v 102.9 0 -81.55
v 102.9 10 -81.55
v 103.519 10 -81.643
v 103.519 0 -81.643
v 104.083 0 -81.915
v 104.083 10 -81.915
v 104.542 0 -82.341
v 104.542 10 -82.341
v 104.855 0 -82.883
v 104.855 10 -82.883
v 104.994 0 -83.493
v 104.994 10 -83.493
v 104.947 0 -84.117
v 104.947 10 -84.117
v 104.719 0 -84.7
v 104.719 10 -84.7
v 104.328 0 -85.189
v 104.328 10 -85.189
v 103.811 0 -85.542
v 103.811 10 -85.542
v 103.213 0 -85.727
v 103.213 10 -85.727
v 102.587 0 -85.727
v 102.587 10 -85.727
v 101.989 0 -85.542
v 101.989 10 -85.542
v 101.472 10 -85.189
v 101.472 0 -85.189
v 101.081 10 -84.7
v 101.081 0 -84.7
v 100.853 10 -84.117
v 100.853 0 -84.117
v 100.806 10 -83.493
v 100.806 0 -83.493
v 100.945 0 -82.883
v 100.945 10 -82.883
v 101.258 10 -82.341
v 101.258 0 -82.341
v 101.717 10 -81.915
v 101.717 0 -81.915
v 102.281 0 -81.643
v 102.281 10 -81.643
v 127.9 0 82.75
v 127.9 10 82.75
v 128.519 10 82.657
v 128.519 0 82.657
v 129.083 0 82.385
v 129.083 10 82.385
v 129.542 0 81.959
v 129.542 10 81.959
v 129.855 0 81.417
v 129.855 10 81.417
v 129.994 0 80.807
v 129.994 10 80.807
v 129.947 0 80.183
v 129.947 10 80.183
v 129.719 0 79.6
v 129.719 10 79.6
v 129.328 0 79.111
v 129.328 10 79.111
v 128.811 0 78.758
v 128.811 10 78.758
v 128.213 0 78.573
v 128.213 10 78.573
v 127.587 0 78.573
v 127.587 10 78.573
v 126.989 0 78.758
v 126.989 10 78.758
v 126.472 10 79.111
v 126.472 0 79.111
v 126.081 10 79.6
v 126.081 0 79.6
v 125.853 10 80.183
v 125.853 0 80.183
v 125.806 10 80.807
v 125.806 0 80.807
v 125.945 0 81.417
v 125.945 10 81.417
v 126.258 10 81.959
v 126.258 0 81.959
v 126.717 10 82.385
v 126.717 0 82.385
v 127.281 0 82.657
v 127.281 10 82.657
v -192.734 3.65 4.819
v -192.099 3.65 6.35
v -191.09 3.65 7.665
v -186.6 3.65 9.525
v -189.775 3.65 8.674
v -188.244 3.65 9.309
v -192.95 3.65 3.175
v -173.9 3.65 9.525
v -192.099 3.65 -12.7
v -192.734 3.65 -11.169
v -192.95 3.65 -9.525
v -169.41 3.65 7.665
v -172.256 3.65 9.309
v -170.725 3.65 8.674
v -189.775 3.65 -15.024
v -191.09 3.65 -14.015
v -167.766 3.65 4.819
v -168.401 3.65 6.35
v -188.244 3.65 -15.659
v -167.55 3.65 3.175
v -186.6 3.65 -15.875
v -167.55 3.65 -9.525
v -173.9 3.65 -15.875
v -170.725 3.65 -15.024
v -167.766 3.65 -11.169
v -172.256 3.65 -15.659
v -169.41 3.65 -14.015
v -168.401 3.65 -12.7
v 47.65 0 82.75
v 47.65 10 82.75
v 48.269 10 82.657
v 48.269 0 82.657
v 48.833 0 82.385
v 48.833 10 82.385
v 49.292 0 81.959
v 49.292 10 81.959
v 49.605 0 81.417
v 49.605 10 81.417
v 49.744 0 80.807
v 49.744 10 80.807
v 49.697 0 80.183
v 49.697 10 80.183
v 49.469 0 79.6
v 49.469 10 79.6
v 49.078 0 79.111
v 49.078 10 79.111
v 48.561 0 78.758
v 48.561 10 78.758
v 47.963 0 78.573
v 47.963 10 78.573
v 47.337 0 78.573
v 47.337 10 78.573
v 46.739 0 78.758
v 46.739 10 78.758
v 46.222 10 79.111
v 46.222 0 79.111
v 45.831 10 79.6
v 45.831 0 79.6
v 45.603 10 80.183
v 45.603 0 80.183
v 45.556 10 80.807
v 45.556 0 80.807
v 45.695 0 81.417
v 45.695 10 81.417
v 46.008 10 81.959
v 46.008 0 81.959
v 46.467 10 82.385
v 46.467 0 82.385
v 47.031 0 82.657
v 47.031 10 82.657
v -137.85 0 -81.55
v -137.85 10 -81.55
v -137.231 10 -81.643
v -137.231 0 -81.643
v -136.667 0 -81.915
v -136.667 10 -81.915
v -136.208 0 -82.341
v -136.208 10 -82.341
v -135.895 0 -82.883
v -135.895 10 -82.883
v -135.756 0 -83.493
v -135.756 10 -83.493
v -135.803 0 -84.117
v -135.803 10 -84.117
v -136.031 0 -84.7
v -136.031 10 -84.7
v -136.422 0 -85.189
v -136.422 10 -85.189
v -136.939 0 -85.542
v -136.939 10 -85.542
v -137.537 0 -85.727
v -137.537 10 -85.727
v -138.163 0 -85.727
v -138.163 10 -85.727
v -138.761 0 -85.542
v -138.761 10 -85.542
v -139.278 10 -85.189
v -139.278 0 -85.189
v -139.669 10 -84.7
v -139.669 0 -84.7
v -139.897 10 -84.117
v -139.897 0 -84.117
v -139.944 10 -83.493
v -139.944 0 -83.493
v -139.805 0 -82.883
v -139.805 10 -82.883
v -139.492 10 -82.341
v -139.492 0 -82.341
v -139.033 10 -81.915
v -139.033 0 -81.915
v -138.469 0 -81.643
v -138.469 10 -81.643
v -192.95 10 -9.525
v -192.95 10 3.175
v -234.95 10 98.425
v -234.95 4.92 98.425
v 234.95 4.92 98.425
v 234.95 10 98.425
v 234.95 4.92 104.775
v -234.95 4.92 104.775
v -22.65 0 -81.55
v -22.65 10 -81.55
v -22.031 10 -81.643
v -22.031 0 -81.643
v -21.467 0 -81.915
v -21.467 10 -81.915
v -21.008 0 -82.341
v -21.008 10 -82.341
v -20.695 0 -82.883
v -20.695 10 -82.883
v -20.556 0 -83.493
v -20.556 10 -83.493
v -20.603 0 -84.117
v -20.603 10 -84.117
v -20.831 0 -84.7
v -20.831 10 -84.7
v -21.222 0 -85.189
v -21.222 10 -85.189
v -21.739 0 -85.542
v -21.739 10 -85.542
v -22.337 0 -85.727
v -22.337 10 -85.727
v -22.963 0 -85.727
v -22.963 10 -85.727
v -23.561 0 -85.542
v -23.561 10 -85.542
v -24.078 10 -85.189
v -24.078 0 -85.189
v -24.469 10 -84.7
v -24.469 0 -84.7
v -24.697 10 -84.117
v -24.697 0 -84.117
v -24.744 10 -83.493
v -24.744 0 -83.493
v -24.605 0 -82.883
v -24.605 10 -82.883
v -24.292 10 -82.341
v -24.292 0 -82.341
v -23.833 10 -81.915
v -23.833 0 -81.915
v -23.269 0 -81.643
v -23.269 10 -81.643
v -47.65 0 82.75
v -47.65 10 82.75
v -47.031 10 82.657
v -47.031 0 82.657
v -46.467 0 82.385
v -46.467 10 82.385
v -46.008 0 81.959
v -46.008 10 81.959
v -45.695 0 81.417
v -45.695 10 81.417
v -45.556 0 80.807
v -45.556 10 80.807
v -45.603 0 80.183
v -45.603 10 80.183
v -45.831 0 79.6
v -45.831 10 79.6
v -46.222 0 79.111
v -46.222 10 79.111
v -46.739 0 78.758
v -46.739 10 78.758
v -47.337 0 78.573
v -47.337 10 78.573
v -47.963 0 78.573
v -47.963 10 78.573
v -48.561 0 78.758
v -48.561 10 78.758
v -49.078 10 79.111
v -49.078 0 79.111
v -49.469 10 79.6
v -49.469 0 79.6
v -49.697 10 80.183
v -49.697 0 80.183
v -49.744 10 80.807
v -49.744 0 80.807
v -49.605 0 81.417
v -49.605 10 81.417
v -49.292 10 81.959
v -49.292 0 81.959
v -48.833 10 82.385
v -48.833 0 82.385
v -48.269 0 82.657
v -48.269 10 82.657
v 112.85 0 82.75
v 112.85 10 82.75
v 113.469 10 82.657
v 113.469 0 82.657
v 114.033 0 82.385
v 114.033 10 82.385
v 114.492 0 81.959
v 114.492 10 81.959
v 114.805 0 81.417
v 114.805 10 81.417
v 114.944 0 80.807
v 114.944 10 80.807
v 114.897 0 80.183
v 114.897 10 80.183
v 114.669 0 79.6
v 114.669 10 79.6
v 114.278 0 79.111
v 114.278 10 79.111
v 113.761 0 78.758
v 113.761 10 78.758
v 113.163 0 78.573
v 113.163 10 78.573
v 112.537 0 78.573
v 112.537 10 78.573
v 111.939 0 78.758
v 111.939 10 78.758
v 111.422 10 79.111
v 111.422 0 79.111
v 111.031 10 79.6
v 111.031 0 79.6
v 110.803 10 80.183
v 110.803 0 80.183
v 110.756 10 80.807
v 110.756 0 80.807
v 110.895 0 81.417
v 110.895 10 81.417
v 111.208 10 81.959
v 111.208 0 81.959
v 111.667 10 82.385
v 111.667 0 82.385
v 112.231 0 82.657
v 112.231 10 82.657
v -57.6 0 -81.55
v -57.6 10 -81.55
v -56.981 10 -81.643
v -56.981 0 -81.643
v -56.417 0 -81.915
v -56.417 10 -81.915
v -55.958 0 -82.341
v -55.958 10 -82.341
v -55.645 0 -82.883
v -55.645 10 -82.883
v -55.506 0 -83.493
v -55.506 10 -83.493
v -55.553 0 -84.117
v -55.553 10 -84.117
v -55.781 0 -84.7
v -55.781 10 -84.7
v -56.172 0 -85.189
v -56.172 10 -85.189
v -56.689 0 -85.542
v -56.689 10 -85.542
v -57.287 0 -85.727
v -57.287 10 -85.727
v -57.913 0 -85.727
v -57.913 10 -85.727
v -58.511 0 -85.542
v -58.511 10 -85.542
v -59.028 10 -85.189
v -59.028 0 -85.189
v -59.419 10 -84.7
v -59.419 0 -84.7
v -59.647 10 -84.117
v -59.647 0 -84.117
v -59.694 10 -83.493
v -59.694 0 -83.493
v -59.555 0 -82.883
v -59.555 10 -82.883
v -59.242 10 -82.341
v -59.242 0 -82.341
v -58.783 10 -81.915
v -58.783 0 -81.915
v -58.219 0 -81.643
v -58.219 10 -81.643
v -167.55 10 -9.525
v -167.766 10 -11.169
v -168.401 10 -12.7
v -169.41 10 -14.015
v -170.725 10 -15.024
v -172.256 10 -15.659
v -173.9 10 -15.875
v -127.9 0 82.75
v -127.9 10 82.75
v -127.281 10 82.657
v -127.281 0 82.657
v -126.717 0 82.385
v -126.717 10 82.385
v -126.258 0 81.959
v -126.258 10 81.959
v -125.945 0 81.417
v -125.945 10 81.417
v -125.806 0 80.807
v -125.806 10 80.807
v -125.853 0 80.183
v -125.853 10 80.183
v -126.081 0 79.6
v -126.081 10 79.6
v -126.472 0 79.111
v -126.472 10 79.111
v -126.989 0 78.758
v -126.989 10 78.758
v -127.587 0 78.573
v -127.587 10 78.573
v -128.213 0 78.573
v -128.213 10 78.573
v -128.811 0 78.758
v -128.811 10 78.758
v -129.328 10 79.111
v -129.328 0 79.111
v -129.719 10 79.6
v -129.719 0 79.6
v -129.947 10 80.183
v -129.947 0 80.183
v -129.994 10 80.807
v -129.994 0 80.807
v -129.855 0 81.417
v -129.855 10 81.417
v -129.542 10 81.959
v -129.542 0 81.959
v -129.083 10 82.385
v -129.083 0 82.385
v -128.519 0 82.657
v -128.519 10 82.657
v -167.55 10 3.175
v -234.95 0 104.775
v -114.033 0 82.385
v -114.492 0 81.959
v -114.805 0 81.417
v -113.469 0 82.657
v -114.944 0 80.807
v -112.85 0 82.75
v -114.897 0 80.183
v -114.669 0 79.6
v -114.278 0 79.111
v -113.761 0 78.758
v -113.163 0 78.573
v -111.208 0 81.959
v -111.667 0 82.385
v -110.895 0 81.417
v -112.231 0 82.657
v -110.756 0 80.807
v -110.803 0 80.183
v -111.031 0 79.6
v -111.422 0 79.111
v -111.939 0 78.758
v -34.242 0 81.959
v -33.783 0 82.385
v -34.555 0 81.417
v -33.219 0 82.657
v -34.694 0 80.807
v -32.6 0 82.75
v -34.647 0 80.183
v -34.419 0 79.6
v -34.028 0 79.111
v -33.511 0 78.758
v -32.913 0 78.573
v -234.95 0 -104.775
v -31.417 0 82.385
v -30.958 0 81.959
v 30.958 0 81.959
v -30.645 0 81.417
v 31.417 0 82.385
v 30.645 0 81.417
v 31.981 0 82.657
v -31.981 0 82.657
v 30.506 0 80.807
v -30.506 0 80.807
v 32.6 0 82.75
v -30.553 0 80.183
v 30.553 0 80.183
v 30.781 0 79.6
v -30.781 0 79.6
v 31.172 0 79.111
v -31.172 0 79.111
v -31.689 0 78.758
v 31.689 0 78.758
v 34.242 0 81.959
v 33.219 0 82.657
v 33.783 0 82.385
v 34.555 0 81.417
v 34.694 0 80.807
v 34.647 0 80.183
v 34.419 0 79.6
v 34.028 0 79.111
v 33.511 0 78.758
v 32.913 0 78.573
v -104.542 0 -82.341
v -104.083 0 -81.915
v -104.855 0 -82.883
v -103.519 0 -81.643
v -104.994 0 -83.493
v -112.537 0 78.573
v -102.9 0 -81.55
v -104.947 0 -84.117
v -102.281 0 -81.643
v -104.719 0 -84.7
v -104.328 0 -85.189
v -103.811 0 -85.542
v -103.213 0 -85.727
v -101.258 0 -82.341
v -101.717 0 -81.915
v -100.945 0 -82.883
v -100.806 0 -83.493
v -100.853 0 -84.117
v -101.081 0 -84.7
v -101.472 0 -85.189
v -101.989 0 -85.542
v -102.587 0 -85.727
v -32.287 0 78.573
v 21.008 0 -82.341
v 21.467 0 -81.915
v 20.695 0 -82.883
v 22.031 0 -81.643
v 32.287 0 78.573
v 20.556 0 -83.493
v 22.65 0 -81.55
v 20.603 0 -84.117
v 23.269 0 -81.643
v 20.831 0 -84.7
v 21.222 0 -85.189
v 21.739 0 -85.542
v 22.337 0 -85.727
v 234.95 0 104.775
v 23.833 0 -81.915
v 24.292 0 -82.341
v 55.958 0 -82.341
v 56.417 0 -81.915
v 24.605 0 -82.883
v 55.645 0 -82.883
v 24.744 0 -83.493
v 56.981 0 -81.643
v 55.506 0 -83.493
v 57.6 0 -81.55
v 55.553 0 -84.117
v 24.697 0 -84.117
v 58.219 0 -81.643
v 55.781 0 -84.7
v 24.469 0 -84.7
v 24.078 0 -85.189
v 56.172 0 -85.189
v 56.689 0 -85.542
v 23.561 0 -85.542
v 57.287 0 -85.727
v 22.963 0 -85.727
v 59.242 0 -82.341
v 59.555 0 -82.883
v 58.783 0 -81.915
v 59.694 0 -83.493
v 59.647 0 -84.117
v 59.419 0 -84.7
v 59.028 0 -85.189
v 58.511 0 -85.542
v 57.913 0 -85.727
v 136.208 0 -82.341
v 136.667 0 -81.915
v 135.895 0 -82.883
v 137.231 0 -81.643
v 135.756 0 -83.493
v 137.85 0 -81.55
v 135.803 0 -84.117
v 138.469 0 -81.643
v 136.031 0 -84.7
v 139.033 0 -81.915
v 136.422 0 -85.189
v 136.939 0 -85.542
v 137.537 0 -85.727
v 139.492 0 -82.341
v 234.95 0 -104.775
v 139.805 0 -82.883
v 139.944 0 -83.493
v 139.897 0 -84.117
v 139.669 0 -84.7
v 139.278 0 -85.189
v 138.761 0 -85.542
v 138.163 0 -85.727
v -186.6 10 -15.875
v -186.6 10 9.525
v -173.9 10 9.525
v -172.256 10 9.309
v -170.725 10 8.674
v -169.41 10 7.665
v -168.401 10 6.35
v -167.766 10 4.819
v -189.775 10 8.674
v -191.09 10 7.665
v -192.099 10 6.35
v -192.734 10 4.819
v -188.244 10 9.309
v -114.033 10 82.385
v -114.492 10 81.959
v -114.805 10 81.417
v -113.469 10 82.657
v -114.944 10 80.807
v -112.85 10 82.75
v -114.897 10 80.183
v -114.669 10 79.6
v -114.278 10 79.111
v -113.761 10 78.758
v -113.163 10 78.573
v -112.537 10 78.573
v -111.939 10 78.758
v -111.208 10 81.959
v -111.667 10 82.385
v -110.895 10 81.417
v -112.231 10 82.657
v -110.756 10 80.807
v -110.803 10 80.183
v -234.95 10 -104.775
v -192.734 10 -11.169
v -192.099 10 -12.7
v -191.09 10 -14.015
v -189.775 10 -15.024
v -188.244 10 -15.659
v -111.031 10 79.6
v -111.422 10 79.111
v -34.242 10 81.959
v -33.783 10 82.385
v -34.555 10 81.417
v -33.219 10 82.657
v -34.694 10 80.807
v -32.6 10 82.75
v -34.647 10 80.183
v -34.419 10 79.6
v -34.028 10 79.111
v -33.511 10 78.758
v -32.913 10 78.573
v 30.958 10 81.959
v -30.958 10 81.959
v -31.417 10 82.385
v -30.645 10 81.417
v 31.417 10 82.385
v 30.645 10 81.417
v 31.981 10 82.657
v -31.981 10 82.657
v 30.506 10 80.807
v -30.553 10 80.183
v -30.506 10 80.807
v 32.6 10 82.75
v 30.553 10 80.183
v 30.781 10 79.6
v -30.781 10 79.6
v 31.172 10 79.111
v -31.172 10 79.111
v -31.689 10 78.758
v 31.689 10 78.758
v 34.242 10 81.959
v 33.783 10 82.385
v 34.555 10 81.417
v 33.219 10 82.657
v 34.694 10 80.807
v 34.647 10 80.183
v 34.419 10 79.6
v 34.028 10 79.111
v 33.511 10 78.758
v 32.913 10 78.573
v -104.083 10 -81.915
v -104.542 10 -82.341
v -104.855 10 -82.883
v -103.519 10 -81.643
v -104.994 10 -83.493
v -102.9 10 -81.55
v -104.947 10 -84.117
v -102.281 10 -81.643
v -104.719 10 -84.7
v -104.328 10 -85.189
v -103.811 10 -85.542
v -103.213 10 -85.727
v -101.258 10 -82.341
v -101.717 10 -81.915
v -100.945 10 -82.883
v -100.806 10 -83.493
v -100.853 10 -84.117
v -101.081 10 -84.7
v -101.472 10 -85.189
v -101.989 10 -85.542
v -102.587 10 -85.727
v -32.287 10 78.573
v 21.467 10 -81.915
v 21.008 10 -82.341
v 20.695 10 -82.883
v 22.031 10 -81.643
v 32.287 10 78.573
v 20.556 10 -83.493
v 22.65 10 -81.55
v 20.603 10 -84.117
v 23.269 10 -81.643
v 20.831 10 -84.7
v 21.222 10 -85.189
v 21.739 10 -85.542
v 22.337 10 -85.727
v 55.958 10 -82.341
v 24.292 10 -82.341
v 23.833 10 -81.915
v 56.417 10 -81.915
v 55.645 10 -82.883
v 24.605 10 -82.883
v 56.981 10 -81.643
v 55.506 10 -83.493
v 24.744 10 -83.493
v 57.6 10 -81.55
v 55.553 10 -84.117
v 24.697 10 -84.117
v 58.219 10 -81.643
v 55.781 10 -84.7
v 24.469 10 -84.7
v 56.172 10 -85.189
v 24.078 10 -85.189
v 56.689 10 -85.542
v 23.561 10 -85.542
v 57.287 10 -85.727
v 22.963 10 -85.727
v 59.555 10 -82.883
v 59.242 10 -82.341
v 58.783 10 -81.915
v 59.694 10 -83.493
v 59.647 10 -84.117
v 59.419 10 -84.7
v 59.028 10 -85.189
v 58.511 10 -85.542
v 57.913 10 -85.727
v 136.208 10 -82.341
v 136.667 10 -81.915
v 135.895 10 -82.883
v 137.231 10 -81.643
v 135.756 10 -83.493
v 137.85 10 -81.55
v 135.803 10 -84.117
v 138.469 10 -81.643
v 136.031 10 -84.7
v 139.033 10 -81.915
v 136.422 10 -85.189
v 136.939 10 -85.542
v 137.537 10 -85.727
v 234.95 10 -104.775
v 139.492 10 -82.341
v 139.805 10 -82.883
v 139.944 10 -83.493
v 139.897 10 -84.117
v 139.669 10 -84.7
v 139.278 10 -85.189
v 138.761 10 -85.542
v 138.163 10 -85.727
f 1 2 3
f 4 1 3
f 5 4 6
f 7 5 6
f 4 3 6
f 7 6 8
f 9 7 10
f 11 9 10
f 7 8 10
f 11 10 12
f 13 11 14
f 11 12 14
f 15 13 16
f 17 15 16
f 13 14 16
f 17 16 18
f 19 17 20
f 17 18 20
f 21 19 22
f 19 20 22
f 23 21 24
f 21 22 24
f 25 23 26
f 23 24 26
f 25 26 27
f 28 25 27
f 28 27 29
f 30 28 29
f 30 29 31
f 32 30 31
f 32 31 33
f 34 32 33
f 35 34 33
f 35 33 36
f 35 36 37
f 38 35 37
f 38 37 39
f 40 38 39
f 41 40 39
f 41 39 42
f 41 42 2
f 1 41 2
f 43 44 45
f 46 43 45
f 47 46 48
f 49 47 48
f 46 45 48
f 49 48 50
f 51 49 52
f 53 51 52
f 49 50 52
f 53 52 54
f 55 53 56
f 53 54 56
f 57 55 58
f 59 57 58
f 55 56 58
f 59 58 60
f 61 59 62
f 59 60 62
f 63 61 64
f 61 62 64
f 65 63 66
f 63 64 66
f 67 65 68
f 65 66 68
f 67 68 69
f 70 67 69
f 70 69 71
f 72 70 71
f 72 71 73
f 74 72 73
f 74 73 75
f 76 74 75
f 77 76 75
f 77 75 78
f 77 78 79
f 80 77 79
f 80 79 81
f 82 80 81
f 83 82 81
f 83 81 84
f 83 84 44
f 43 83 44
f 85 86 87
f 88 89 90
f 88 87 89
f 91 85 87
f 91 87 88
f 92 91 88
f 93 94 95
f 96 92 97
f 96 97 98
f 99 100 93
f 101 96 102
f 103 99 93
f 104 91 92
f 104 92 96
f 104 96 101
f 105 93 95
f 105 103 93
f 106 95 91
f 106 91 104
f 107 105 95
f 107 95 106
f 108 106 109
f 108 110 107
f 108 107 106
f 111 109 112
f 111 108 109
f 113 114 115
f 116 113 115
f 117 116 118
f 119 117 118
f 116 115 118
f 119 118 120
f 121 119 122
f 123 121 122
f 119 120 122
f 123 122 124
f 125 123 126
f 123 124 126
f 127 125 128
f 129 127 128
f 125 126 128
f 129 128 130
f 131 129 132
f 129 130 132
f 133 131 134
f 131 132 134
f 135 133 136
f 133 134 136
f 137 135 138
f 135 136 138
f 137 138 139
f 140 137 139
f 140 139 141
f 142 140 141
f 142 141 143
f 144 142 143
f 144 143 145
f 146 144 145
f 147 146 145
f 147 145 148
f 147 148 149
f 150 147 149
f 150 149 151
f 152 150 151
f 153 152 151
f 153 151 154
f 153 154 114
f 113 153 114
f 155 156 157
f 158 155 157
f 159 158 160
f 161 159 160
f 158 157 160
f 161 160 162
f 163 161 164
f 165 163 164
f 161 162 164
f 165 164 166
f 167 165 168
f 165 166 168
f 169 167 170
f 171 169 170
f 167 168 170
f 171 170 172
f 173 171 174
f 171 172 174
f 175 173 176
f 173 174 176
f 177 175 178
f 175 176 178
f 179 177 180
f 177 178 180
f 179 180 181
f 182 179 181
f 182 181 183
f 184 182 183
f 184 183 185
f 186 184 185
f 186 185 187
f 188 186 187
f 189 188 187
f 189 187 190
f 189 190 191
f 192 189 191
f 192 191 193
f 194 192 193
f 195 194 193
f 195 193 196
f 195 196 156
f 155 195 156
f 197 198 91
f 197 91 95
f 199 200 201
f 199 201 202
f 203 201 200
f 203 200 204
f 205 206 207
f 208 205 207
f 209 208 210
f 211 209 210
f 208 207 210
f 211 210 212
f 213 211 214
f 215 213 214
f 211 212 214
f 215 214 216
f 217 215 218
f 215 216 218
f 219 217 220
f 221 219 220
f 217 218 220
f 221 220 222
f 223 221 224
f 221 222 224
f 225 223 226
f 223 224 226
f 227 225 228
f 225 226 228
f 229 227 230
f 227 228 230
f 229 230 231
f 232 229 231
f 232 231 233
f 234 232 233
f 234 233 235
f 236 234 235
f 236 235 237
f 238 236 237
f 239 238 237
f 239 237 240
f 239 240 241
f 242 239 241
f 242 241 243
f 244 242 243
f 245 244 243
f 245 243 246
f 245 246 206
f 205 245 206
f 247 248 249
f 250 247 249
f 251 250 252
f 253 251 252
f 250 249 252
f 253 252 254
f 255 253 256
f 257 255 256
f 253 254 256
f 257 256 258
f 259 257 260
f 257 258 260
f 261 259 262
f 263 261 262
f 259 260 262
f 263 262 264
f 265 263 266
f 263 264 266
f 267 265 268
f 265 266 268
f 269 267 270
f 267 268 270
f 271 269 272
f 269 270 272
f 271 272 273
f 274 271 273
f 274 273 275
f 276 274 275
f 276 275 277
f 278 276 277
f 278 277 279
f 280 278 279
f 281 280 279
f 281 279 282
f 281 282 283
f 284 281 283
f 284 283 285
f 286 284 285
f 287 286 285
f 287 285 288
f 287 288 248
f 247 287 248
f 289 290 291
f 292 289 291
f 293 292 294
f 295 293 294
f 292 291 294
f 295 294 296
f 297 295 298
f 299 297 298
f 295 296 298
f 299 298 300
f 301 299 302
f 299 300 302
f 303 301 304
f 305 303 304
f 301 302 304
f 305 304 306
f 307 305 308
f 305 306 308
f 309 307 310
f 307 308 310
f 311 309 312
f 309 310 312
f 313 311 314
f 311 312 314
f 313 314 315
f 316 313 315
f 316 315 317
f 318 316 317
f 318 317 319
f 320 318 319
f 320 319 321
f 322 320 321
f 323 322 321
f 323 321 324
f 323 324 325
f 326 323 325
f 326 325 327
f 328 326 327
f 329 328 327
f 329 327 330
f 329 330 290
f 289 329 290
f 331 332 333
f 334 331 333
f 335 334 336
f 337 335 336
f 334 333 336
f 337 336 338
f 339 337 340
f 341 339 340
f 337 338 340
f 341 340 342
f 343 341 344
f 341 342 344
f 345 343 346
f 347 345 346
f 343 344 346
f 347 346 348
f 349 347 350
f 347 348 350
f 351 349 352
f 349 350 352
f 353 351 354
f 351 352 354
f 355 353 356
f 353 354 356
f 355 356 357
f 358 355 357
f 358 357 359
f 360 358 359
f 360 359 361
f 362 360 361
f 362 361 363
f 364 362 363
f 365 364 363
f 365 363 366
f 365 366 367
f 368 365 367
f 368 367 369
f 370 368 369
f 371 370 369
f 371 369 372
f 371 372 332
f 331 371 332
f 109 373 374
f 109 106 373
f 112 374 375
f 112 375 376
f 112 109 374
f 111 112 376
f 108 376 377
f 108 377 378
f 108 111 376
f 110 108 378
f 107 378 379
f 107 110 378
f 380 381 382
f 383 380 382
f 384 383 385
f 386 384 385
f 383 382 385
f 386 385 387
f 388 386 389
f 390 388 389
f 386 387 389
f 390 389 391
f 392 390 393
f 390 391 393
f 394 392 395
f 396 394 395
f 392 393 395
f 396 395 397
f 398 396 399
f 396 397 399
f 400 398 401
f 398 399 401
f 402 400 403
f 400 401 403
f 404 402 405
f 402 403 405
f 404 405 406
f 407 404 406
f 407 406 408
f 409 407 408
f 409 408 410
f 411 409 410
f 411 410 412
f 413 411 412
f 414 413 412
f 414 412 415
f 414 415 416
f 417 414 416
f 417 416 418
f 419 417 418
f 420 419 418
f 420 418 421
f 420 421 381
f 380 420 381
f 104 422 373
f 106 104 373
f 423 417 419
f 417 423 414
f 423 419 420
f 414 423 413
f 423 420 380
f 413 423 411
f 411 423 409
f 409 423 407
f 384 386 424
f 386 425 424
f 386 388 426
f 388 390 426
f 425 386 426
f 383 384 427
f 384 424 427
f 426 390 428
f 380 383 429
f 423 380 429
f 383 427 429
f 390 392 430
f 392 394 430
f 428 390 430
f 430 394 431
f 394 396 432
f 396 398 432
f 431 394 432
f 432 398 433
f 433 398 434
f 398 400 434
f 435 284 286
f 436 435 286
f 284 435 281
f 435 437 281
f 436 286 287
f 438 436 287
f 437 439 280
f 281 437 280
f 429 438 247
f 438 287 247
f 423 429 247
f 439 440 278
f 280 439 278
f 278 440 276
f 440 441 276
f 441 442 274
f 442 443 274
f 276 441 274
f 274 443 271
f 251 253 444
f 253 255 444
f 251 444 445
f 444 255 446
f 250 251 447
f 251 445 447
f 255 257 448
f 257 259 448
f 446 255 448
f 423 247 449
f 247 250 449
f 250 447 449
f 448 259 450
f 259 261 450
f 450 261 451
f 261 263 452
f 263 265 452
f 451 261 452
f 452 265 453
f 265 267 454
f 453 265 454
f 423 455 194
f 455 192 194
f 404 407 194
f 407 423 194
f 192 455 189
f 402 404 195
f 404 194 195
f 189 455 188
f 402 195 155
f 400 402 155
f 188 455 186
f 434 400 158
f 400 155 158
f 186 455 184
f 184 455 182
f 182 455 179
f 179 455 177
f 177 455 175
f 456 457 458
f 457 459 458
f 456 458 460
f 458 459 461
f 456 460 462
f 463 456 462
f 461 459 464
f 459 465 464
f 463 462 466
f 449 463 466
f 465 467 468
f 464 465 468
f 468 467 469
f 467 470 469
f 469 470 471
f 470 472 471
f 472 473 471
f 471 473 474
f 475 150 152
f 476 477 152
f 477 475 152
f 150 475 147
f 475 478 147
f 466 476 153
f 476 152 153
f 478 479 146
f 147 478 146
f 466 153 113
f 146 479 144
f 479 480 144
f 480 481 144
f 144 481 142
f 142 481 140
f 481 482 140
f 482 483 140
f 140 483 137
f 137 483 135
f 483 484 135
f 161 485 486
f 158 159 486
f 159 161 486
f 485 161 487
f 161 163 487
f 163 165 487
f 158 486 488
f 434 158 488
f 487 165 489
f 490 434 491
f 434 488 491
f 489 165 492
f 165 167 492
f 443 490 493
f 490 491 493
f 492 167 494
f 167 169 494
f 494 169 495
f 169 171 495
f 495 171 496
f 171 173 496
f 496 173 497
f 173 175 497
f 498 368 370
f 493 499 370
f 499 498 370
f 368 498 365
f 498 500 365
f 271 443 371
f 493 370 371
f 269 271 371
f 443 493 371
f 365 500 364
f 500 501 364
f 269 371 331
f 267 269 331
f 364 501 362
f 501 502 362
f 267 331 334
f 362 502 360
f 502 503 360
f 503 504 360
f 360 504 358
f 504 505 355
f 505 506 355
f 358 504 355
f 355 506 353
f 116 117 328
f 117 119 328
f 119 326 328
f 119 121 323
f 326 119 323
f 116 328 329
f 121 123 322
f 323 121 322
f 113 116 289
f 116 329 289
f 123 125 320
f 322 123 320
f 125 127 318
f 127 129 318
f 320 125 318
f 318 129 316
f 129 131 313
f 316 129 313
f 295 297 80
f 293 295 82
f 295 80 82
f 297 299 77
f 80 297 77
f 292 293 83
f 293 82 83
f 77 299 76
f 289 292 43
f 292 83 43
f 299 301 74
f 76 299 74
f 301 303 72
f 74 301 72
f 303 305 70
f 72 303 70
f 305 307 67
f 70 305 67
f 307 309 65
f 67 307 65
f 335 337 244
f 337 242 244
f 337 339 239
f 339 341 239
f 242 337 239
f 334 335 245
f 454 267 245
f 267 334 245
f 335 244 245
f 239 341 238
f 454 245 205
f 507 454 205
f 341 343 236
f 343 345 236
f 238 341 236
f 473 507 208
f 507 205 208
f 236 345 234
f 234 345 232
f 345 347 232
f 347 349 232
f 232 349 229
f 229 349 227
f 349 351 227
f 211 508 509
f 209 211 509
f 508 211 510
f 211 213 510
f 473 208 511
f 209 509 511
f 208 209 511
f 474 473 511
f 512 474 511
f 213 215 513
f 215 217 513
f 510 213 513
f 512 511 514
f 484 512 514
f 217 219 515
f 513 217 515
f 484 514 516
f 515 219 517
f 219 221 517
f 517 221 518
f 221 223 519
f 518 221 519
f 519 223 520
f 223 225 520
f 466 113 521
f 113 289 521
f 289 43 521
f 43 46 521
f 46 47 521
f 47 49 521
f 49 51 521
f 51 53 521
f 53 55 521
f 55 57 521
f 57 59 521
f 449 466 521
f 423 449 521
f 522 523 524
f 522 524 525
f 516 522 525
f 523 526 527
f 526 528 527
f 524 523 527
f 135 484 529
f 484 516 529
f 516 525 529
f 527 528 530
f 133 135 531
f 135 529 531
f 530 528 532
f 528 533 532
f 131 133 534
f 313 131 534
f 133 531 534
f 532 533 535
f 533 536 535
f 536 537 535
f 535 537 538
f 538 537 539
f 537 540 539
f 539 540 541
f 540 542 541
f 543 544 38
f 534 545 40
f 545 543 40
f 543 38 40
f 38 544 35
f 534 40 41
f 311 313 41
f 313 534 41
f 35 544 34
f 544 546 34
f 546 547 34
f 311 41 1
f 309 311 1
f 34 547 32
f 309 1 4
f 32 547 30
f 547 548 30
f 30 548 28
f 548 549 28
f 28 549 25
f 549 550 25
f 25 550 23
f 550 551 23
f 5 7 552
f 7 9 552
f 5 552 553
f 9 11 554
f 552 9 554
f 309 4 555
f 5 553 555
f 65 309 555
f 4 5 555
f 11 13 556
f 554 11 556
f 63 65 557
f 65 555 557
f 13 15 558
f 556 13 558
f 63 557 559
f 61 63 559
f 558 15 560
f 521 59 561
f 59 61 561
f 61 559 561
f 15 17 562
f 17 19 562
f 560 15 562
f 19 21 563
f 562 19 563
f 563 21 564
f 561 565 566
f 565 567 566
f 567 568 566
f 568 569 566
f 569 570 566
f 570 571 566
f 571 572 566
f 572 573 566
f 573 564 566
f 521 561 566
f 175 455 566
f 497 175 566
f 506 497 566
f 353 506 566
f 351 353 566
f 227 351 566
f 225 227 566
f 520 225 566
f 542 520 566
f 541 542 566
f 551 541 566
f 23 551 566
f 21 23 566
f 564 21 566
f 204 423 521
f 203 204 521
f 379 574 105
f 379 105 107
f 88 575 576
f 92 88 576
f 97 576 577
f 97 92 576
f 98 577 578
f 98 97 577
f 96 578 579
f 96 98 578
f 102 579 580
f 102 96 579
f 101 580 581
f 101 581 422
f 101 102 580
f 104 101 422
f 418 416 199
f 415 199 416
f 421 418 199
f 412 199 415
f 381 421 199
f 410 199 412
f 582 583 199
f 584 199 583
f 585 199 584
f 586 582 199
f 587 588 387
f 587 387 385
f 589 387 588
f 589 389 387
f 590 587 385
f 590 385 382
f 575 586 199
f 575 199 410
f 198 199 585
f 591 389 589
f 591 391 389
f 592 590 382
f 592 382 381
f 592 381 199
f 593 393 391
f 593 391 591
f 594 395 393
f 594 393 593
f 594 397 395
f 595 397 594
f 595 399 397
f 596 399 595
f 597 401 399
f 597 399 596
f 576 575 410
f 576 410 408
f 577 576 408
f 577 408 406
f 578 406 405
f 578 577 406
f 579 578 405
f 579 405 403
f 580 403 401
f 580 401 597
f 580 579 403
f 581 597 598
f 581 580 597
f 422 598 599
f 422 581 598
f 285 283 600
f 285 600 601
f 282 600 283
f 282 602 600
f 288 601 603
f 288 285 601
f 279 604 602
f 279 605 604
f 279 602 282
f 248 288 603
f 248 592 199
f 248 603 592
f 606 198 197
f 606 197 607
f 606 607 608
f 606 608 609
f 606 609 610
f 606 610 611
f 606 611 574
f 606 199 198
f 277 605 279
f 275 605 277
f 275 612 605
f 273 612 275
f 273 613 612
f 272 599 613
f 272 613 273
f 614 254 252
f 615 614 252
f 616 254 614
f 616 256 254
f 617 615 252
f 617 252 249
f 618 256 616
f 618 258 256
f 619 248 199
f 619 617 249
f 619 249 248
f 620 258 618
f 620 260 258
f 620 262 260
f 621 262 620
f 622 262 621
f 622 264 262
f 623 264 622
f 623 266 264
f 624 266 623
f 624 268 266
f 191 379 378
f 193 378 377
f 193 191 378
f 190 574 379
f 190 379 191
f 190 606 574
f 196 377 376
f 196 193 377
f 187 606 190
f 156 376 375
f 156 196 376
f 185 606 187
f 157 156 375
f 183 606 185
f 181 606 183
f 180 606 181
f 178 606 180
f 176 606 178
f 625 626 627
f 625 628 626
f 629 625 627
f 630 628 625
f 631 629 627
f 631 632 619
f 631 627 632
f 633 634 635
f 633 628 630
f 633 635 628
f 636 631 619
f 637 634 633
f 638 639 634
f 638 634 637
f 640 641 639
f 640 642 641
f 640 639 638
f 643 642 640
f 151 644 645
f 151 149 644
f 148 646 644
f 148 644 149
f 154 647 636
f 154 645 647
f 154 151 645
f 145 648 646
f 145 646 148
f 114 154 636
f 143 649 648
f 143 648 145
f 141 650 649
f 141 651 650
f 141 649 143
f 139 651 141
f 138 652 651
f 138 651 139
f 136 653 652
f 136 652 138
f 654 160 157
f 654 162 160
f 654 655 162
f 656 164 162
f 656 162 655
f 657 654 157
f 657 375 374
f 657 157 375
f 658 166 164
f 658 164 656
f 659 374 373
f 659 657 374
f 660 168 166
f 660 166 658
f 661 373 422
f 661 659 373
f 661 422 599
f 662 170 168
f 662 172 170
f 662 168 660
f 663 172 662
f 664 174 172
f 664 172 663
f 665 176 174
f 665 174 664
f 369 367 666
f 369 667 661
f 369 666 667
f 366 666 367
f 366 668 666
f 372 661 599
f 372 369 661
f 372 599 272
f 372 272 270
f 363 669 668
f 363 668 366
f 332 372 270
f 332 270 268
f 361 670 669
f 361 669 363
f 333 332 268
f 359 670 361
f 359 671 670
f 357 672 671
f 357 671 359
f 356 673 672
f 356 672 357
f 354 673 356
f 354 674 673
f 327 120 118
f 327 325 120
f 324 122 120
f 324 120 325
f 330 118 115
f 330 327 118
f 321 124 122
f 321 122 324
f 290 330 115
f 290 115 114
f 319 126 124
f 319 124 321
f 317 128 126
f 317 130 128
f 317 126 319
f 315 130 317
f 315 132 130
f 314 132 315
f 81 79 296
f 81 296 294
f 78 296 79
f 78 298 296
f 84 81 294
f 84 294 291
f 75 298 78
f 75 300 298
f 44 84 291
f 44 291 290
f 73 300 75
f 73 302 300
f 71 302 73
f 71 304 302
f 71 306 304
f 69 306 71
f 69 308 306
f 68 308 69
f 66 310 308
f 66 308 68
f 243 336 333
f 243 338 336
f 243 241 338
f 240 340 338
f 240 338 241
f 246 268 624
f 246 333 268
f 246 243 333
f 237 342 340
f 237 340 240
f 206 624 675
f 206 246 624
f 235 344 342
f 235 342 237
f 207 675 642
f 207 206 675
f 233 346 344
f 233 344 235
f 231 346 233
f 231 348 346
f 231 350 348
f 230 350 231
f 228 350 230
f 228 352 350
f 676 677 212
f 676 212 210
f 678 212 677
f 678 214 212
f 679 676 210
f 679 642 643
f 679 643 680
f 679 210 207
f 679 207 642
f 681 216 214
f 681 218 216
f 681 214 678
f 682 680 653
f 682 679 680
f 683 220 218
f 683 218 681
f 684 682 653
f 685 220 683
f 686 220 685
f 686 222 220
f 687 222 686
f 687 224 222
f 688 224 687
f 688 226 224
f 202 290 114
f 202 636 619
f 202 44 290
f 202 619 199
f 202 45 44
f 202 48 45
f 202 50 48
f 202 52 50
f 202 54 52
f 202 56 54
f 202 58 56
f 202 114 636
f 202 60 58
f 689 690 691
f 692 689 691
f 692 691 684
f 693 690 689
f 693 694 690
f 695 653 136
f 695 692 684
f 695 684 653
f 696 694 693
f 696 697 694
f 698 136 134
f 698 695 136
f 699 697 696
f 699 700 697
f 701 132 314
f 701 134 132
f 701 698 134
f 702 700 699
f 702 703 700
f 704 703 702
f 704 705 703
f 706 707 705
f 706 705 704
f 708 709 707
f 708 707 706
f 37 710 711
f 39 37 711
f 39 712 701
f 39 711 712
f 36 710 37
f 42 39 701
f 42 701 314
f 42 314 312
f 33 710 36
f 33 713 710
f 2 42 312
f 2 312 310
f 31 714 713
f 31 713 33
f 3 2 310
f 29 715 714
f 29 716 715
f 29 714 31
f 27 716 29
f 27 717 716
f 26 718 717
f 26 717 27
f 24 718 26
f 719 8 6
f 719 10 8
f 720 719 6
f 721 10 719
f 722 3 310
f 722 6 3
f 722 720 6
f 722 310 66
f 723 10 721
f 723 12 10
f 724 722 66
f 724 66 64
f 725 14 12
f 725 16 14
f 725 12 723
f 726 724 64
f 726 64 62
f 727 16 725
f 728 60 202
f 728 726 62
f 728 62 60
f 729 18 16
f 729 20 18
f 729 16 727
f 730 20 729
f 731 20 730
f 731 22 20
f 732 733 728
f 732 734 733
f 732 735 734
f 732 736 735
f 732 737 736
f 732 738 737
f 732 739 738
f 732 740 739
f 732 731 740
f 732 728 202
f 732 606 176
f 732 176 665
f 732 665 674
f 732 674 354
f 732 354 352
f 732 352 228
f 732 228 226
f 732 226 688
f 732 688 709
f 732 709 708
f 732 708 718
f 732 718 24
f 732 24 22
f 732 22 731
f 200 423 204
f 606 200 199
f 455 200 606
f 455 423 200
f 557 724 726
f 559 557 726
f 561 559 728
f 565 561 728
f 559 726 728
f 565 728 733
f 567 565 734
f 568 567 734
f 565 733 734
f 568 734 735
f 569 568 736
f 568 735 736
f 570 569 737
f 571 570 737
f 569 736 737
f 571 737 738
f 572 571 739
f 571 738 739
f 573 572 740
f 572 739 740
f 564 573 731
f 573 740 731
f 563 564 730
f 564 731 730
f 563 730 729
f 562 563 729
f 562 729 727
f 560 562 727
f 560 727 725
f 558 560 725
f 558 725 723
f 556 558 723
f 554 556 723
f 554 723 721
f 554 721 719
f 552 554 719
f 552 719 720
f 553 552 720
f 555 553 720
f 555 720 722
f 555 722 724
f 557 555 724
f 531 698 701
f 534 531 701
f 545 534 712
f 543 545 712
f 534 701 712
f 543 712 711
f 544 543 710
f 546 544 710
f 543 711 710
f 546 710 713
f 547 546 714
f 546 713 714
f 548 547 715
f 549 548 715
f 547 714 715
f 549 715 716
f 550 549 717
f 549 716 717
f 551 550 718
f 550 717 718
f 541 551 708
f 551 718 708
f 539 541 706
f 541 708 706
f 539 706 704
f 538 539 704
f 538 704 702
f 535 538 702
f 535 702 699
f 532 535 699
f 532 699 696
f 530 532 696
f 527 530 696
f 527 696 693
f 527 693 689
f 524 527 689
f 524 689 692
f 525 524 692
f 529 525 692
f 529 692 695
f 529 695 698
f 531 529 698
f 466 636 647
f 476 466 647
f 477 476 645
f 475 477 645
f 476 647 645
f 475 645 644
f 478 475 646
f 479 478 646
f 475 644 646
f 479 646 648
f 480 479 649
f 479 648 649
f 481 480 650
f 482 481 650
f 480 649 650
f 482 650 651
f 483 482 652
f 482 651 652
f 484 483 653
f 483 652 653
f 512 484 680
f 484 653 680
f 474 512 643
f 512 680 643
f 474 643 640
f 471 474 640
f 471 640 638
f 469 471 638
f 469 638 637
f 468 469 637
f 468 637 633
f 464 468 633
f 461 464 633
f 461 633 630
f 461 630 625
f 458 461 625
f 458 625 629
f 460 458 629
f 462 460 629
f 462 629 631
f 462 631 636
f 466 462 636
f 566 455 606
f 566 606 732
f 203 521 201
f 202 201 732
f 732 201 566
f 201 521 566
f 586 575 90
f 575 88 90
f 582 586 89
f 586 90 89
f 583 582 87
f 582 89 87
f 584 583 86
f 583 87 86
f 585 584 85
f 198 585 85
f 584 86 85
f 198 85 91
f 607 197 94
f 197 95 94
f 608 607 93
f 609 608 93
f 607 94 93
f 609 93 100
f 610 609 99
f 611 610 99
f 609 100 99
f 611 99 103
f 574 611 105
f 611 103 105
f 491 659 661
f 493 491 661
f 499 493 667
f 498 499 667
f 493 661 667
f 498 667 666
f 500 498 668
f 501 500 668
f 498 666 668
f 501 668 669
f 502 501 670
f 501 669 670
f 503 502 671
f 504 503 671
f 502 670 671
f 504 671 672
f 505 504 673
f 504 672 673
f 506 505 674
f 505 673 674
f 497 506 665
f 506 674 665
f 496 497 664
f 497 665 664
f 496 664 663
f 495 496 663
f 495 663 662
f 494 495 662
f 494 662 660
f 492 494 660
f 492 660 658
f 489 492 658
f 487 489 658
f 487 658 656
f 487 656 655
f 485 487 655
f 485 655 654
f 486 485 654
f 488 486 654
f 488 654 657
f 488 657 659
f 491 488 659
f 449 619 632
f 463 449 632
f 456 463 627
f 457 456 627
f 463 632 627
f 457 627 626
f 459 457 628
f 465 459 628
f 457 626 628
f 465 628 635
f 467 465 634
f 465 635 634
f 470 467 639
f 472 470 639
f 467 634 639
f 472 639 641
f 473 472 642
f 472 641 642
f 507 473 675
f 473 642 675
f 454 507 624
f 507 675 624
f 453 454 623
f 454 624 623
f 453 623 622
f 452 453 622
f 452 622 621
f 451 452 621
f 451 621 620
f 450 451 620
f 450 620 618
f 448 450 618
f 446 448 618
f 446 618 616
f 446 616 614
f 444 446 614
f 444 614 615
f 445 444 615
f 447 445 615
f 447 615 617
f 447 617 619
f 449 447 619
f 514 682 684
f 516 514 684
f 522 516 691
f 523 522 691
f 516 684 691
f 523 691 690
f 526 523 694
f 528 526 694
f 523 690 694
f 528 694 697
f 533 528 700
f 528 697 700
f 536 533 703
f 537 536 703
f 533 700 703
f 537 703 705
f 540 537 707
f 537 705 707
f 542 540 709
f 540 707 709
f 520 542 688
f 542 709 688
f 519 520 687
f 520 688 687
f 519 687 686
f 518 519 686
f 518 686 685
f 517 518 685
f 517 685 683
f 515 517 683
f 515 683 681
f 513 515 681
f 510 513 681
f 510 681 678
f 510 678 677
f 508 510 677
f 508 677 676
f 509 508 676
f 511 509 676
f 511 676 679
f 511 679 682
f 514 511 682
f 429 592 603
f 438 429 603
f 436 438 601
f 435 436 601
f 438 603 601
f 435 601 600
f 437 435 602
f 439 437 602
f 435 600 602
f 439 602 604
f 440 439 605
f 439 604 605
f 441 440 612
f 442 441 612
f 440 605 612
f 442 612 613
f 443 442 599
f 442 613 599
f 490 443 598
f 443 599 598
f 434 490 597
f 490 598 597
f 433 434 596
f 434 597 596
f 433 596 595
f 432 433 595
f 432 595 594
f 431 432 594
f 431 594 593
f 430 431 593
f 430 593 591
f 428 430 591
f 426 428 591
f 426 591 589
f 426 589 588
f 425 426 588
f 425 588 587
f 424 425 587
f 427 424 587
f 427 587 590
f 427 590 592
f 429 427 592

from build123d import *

# Parameters (mm, degrees)
SKETCH3_W           = 469.9
SKETCH3_H           = 209.55
BOSS_EXTRUDE1_DEPTH = 10
SKETCH4_R           = 2.1
CUT_EXTRUDE3_DEPTH  = 258.447670654
SKETCH5_R           = 2.1
CUT_EXTRUDE4_DEPTH  = 258.447670654
SKETCH7_W           = 25.4
SKETCH7_H           = 25.4
CUT_EXTRUDE5_DEPTH  = 6.35
CUT_EXTRUDE6_REACH  = 483.543
SKETCH8_W           = 6.35
SKETCH8_H           = 5.08
FILLET1_R           = 6.35


with BuildPart() as part:
    # Sketch3 → Boss-Extrude1 (new body)
    with BuildSketch(Plane(origin=(0, 0, 0), x_dir=(1, 0, 0), z_dir=(0, 1, 0))):
        Rectangle(SKETCH3_W, SKETCH3_H)
    extrude(amount=BOSS_EXTRUDE1_DEPTH)

    # Sketch4 → Cut-Extrude3 (cut, through all)
    with BuildSketch(Plane(origin=(0, 10, 0), x_dir=(1, 0, 0), z_dir=(0, 1, 0))):
        with Locations(Location((-102.9, 83.65, 0), (0, 0, 270))):
            Circle(SKETCH4_R)
        with Locations(Location((-22.65, 83.65, 0), (0, 0, 270))):
            Circle(SKETCH4_R)
        with Locations(Location((57.6, 83.65, 0), (0, 0, 270))):
            Circle(SKETCH4_R)
        with Locations(Location((137.85, 83.65, 0), (0, 0, 270))):
            Circle(SKETCH4_R)
        with Locations(Location((112.85, -80.65, 0), (0, 0, 270))):
            Circle(SKETCH4_R)
        with Locations(Location((32.6, -80.65, 0), (0, 0, 270))):
            Circle(SKETCH4_R)
        with Locations(Location((-47.65, -80.65, 0), (0, 0, 270))):
            Circle(SKETCH4_R)
        with Locations(Location((-127.9, -80.65, 0), (0, 0, 270))):
            Circle(SKETCH4_R)
    extrude(amount=-CUT_EXTRUDE3_DEPTH, mode=Mode.SUBTRACT)

    # Sketch5 → Cut-Extrude4 (cut, through all)
    with BuildSketch(Plane(origin=(0, 10, 0), x_dir=(1, 0, 0), z_dir=(0, 1, 0))):
        with Locations(Location((-137.85, 83.65, 0), (0, 0, 270))):
            Circle(SKETCH5_R)
        with Locations(Location((-57.6, 83.65, 0), (0, 0, 270))):
            Circle(SKETCH5_R)
        with Locations(Location((22.65, 83.65, 0), (0, 0, 270))):
            Circle(SKETCH5_R)
        with Locations(Location((102.9, 83.65, 0), (0, 0, 270))):
            Circle(SKETCH5_R)
        with Locations(Location((-112.85, -80.65, 0), (0, 0, 270))):
            Circle(SKETCH5_R)
        with Locations(Location((-32.6, -80.65, 0), (0, 0, 270))):
            Circle(SKETCH5_R)
        with Locations(Location((47.65, -80.65, 0), (0, 0, 270))):
            Circle(SKETCH5_R)
        with Locations(Location((127.9, -80.65, 0), (0, 0, 270))):
            Circle(SKETCH5_R)
    extrude(amount=-CUT_EXTRUDE4_DEPTH, mode=Mode.SUBTRACT)

    # Sketch7 → Cut-Extrude5 (cut)
    with BuildSketch(Plane(origin=(0, 10, 0), x_dir=(1, 0, 0), z_dir=(0, 1, 0))):
        with Locations((-180.25, 3.175)):
            Rectangle(SKETCH7_W, SKETCH7_H)
    extrude(amount=-CUT_EXTRUDE5_DEPTH, mode=Mode.SUBTRACT)

    # Sketch8 → Cut-Extrude6 (cut, up to next)
    with BuildSketch(Plane.ZY.offset(234.95), mode=Mode.PRIVATE) as cut_extrude6_sk1:
        with Locations((101.6, 7.46)):
            Rectangle(SKETCH8_W, SKETCH8_H)
    cut_extrude6_tool1 = extrude(cut_extrude6_sk1.sketch, amount=-CUT_EXTRUDE6_REACH, mode=Mode.PRIVATE) & part.part
    add(cut_extrude6_tool1.solids().sort_by_distance((-234.95, 7.46, 101.6))[0], mode=Mode.SUBTRACT)

    # Fillet1
    fillet1_edges = [part.edges().sort_by_distance(p)[0] for p in [
        (-167.55, 6.825, -15.875),
        (-167.55, 6.825, 9.525),
        (-192.95, 6.825, 9.525),
        (-192.95, 6.825, -15.875),
    ]]
    fillet(fillet1_edges, radius=FILLET1_R)


solid = part.part
